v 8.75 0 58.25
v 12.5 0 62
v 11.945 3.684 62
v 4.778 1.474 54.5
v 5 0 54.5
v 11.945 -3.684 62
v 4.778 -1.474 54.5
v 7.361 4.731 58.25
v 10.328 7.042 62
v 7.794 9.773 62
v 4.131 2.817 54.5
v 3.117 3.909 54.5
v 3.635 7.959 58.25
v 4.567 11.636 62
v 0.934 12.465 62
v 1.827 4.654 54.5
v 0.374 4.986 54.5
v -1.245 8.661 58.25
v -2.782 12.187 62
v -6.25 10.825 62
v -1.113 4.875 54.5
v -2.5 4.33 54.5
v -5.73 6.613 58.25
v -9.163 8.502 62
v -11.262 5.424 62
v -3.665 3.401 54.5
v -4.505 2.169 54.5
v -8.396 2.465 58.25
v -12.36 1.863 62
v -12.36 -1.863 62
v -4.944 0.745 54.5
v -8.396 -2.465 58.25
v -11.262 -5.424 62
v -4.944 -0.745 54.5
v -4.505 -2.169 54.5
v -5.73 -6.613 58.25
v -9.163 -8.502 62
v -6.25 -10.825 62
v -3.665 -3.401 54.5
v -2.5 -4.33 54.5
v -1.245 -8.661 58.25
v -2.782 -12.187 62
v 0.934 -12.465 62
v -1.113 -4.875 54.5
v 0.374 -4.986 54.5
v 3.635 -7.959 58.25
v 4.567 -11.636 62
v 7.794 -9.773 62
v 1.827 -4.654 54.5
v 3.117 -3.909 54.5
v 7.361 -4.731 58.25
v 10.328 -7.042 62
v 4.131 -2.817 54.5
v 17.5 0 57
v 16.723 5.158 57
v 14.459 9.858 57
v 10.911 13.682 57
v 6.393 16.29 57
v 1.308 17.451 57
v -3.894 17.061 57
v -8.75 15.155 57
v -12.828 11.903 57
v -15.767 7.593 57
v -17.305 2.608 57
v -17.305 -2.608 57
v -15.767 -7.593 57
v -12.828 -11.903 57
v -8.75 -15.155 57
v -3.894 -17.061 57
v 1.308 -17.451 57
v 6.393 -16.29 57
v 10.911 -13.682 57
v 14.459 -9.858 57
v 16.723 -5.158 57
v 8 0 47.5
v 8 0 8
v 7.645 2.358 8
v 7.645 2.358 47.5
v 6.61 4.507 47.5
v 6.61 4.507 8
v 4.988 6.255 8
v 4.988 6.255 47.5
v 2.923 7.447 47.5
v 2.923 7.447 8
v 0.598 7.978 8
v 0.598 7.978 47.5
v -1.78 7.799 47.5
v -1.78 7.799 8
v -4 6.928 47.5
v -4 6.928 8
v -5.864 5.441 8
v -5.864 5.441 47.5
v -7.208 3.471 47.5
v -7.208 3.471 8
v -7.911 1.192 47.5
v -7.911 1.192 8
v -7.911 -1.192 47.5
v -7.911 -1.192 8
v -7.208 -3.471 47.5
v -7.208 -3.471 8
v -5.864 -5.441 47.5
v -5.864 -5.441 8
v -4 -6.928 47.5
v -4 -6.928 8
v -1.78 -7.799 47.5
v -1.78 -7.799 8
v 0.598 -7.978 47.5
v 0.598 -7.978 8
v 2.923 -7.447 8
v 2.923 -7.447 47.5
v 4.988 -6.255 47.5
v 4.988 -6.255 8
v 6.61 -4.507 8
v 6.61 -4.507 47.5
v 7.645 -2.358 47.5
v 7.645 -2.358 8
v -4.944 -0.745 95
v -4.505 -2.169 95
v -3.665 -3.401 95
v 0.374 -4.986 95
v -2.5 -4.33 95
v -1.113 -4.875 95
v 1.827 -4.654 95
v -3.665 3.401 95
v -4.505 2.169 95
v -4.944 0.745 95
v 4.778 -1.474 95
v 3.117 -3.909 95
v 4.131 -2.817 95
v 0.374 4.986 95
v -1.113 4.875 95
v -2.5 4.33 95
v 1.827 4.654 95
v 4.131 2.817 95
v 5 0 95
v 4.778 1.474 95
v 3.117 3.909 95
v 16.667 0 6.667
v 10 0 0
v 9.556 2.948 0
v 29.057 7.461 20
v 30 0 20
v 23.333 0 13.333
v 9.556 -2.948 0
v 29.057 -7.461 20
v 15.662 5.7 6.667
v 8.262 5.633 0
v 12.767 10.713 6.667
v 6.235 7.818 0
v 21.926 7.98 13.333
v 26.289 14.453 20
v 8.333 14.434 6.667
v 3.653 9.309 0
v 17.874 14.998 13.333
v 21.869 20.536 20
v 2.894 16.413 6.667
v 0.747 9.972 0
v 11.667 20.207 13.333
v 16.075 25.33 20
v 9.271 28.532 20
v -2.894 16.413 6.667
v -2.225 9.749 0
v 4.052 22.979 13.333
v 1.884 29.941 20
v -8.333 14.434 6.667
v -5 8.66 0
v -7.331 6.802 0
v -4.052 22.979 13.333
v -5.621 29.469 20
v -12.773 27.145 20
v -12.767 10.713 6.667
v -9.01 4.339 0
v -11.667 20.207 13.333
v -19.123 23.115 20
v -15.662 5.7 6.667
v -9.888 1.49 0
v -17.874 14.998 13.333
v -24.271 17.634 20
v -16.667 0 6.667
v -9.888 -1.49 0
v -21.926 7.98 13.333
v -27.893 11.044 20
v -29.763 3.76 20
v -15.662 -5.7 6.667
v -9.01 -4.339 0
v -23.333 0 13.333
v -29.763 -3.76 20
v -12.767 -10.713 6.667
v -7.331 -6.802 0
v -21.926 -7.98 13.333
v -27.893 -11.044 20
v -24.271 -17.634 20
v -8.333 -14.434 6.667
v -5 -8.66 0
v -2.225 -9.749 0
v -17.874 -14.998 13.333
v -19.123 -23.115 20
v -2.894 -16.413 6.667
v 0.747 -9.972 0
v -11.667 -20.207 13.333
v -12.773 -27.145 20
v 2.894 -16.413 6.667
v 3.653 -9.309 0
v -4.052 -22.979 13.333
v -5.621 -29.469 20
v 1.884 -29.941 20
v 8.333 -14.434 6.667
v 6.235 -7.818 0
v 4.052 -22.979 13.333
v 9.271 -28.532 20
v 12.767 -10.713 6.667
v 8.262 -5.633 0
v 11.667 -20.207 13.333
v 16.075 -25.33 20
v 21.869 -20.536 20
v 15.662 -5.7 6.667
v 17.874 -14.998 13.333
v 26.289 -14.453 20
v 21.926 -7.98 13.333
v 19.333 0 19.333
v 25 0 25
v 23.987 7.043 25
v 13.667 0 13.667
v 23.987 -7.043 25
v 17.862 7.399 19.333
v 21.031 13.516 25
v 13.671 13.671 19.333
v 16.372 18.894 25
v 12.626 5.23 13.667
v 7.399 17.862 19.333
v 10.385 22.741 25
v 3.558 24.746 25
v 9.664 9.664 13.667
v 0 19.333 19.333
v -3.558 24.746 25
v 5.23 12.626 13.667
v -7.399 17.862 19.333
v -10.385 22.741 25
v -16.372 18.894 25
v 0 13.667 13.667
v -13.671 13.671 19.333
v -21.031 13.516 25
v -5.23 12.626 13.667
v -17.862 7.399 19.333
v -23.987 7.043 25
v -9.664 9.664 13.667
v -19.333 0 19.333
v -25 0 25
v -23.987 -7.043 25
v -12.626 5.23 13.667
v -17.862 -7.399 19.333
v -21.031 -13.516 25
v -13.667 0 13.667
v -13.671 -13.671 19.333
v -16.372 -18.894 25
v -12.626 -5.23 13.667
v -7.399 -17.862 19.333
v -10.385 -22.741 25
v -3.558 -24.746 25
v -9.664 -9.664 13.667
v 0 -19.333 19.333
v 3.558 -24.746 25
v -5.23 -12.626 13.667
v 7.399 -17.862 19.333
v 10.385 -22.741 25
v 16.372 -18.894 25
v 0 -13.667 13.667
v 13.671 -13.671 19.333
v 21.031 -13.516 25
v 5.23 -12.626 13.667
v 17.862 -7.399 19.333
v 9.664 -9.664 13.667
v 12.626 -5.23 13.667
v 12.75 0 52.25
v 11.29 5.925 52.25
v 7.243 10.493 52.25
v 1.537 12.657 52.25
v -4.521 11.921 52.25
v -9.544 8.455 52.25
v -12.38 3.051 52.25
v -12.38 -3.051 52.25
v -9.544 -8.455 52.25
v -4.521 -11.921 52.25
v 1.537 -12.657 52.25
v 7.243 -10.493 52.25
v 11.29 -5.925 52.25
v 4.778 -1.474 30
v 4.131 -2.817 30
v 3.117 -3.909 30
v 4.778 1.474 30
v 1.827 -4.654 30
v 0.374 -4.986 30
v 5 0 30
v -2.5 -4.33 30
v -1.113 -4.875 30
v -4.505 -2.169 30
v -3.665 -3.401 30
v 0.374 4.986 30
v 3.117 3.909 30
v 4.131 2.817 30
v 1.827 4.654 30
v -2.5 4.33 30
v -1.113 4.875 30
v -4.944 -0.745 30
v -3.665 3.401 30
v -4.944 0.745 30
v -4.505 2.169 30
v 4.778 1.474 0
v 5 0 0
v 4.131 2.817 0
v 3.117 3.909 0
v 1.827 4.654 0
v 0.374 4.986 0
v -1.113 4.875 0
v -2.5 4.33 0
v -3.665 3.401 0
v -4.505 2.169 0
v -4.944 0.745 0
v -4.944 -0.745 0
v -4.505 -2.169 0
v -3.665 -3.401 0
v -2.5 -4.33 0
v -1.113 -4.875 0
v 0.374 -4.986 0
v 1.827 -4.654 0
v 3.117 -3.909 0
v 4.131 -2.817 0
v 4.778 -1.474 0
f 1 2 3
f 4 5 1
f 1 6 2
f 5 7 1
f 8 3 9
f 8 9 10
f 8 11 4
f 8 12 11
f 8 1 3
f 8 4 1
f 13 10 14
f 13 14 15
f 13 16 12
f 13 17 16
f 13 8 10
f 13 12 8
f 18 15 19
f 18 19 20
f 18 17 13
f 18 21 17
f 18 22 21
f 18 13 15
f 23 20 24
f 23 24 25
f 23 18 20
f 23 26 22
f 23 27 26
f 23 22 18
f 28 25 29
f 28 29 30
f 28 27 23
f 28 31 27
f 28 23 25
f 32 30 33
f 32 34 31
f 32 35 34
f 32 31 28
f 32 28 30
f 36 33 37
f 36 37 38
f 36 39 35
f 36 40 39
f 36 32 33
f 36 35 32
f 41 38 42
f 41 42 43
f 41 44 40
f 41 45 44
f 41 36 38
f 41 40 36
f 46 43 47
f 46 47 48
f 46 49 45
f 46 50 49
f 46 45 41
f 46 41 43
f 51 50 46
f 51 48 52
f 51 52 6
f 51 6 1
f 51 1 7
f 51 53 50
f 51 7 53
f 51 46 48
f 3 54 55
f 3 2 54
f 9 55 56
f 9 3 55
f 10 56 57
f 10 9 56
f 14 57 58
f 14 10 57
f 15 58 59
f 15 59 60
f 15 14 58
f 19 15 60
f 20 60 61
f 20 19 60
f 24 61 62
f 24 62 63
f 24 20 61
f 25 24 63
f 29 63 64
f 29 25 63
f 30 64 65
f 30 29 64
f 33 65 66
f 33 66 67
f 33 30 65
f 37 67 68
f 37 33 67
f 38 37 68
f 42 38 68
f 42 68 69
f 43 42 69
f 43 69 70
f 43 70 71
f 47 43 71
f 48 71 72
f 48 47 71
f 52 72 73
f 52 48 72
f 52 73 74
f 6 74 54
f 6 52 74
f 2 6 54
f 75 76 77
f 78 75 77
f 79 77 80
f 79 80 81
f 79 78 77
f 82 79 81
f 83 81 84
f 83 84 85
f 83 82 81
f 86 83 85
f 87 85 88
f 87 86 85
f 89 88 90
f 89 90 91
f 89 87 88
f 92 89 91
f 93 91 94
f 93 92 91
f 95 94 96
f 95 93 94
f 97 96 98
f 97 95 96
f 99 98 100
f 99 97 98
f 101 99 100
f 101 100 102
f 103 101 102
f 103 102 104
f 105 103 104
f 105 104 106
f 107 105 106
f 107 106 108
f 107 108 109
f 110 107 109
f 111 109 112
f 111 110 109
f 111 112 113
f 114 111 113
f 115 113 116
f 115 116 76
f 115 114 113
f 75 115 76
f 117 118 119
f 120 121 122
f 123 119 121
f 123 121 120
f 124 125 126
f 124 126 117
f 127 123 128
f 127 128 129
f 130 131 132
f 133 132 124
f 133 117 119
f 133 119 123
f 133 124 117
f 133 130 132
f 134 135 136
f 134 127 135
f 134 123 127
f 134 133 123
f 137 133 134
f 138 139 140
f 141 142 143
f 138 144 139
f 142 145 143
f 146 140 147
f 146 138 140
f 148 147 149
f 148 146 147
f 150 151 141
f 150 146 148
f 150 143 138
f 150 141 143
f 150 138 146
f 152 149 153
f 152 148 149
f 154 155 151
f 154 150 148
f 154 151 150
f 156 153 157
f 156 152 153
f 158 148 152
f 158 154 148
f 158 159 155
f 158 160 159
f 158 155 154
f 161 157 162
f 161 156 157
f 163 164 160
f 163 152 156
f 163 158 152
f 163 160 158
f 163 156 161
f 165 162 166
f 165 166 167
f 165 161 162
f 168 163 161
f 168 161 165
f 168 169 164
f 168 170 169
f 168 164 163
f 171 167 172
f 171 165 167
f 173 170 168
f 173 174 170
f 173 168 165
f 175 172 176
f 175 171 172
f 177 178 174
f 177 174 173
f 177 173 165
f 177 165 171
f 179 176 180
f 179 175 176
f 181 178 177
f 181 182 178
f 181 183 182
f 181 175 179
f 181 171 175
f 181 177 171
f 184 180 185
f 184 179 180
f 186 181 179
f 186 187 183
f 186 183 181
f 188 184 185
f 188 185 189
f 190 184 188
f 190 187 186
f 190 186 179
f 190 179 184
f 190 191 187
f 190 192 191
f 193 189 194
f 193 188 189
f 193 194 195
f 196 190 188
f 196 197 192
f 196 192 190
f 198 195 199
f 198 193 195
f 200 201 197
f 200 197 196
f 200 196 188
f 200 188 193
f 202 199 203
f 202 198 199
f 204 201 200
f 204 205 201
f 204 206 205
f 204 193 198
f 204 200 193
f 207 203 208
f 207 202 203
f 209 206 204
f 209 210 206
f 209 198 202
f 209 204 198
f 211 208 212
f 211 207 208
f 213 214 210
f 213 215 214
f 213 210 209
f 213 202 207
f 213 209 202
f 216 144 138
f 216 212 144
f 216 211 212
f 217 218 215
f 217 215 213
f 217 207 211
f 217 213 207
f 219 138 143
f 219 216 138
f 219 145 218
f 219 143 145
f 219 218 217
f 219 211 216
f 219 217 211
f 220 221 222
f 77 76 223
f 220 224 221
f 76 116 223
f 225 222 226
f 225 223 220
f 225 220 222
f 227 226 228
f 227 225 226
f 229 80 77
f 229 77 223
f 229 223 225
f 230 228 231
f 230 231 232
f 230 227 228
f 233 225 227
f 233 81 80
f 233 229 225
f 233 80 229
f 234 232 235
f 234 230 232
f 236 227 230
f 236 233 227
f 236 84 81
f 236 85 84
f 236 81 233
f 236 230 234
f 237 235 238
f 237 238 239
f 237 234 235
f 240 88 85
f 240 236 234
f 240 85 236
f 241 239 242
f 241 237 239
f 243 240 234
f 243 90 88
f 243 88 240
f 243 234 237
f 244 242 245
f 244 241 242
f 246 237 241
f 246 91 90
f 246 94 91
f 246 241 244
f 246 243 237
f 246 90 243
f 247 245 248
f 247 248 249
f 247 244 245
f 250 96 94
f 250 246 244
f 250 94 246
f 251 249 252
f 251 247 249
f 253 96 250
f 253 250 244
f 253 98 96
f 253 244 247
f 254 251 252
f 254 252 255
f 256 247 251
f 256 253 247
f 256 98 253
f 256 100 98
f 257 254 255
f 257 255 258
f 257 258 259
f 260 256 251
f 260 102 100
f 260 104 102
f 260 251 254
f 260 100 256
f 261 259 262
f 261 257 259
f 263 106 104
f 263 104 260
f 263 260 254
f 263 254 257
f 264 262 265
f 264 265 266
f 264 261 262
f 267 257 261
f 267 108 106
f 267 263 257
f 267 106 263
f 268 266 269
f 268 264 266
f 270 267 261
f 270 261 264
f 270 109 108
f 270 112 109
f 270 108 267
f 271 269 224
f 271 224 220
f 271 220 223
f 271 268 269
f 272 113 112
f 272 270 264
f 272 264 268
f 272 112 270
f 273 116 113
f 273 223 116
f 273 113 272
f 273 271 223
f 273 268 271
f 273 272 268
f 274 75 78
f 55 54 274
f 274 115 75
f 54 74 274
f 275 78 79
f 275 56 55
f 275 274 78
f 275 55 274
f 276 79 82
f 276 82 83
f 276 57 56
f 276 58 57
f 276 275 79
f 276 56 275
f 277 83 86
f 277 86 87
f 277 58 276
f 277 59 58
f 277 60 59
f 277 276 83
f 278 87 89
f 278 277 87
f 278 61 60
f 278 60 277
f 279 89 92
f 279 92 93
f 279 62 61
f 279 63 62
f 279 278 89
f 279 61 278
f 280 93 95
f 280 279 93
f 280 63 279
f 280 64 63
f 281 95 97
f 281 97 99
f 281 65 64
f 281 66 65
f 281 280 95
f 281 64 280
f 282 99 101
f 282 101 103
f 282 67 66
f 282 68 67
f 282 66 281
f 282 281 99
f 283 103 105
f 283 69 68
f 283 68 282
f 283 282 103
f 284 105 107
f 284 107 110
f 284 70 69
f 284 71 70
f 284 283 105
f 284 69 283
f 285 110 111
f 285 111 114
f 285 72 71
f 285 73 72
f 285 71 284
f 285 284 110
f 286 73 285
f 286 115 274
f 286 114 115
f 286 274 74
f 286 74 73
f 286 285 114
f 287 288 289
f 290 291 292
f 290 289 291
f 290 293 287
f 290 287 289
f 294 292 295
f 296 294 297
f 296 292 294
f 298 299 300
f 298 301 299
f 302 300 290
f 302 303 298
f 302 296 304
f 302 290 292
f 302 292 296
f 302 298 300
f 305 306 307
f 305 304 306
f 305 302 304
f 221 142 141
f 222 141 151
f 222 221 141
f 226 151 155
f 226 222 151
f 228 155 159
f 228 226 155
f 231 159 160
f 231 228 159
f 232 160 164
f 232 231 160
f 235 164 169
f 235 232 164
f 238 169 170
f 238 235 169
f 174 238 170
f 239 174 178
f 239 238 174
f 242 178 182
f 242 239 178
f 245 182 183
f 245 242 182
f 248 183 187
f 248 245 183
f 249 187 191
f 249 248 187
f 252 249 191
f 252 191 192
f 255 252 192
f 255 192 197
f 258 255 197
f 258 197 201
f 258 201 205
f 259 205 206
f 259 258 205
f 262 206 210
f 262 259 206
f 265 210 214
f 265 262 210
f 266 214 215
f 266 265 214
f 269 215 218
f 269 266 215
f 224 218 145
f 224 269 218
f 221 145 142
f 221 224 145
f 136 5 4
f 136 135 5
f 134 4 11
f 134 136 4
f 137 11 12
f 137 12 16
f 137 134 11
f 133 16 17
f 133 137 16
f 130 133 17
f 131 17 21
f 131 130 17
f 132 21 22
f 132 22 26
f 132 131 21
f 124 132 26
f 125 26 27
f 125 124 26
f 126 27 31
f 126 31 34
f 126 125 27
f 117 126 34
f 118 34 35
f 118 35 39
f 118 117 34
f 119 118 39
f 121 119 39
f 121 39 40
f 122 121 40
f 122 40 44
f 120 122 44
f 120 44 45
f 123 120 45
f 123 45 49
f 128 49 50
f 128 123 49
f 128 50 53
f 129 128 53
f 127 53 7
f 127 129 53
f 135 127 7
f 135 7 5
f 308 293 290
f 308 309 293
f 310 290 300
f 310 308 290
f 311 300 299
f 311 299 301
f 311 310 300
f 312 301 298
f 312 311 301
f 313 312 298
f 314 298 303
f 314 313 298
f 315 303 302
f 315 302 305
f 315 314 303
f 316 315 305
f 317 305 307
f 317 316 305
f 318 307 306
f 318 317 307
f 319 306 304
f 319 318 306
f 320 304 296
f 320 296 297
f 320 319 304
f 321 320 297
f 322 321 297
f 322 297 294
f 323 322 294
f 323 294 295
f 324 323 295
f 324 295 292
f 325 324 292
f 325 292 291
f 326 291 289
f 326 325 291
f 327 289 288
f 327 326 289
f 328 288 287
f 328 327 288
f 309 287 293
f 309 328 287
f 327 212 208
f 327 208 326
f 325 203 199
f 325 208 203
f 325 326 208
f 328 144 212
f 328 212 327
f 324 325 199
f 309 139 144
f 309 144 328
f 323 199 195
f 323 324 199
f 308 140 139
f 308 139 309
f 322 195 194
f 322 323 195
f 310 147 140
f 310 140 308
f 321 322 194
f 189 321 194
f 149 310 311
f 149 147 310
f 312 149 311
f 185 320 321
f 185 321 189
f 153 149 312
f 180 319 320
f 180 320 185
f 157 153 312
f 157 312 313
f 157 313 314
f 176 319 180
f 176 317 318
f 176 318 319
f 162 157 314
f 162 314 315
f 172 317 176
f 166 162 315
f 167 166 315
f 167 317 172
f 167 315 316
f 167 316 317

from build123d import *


with BuildPart() as part:
    # Sketch → Revolution (revolve)
    with BuildSketch(Plane.XZ):
        Polygon((0, 30), (5, 30), (5, 0), (10, 0), (30, 20), (25, 25), (8, 8), (8, 47.5), (17.5, 57), (12.5, 62), (5, 54.5), (5, 95), (0, 95), align=None)
    revolve(axis=Axis((0, 0, 0), (0, 0, 1)))


solid = part.part
